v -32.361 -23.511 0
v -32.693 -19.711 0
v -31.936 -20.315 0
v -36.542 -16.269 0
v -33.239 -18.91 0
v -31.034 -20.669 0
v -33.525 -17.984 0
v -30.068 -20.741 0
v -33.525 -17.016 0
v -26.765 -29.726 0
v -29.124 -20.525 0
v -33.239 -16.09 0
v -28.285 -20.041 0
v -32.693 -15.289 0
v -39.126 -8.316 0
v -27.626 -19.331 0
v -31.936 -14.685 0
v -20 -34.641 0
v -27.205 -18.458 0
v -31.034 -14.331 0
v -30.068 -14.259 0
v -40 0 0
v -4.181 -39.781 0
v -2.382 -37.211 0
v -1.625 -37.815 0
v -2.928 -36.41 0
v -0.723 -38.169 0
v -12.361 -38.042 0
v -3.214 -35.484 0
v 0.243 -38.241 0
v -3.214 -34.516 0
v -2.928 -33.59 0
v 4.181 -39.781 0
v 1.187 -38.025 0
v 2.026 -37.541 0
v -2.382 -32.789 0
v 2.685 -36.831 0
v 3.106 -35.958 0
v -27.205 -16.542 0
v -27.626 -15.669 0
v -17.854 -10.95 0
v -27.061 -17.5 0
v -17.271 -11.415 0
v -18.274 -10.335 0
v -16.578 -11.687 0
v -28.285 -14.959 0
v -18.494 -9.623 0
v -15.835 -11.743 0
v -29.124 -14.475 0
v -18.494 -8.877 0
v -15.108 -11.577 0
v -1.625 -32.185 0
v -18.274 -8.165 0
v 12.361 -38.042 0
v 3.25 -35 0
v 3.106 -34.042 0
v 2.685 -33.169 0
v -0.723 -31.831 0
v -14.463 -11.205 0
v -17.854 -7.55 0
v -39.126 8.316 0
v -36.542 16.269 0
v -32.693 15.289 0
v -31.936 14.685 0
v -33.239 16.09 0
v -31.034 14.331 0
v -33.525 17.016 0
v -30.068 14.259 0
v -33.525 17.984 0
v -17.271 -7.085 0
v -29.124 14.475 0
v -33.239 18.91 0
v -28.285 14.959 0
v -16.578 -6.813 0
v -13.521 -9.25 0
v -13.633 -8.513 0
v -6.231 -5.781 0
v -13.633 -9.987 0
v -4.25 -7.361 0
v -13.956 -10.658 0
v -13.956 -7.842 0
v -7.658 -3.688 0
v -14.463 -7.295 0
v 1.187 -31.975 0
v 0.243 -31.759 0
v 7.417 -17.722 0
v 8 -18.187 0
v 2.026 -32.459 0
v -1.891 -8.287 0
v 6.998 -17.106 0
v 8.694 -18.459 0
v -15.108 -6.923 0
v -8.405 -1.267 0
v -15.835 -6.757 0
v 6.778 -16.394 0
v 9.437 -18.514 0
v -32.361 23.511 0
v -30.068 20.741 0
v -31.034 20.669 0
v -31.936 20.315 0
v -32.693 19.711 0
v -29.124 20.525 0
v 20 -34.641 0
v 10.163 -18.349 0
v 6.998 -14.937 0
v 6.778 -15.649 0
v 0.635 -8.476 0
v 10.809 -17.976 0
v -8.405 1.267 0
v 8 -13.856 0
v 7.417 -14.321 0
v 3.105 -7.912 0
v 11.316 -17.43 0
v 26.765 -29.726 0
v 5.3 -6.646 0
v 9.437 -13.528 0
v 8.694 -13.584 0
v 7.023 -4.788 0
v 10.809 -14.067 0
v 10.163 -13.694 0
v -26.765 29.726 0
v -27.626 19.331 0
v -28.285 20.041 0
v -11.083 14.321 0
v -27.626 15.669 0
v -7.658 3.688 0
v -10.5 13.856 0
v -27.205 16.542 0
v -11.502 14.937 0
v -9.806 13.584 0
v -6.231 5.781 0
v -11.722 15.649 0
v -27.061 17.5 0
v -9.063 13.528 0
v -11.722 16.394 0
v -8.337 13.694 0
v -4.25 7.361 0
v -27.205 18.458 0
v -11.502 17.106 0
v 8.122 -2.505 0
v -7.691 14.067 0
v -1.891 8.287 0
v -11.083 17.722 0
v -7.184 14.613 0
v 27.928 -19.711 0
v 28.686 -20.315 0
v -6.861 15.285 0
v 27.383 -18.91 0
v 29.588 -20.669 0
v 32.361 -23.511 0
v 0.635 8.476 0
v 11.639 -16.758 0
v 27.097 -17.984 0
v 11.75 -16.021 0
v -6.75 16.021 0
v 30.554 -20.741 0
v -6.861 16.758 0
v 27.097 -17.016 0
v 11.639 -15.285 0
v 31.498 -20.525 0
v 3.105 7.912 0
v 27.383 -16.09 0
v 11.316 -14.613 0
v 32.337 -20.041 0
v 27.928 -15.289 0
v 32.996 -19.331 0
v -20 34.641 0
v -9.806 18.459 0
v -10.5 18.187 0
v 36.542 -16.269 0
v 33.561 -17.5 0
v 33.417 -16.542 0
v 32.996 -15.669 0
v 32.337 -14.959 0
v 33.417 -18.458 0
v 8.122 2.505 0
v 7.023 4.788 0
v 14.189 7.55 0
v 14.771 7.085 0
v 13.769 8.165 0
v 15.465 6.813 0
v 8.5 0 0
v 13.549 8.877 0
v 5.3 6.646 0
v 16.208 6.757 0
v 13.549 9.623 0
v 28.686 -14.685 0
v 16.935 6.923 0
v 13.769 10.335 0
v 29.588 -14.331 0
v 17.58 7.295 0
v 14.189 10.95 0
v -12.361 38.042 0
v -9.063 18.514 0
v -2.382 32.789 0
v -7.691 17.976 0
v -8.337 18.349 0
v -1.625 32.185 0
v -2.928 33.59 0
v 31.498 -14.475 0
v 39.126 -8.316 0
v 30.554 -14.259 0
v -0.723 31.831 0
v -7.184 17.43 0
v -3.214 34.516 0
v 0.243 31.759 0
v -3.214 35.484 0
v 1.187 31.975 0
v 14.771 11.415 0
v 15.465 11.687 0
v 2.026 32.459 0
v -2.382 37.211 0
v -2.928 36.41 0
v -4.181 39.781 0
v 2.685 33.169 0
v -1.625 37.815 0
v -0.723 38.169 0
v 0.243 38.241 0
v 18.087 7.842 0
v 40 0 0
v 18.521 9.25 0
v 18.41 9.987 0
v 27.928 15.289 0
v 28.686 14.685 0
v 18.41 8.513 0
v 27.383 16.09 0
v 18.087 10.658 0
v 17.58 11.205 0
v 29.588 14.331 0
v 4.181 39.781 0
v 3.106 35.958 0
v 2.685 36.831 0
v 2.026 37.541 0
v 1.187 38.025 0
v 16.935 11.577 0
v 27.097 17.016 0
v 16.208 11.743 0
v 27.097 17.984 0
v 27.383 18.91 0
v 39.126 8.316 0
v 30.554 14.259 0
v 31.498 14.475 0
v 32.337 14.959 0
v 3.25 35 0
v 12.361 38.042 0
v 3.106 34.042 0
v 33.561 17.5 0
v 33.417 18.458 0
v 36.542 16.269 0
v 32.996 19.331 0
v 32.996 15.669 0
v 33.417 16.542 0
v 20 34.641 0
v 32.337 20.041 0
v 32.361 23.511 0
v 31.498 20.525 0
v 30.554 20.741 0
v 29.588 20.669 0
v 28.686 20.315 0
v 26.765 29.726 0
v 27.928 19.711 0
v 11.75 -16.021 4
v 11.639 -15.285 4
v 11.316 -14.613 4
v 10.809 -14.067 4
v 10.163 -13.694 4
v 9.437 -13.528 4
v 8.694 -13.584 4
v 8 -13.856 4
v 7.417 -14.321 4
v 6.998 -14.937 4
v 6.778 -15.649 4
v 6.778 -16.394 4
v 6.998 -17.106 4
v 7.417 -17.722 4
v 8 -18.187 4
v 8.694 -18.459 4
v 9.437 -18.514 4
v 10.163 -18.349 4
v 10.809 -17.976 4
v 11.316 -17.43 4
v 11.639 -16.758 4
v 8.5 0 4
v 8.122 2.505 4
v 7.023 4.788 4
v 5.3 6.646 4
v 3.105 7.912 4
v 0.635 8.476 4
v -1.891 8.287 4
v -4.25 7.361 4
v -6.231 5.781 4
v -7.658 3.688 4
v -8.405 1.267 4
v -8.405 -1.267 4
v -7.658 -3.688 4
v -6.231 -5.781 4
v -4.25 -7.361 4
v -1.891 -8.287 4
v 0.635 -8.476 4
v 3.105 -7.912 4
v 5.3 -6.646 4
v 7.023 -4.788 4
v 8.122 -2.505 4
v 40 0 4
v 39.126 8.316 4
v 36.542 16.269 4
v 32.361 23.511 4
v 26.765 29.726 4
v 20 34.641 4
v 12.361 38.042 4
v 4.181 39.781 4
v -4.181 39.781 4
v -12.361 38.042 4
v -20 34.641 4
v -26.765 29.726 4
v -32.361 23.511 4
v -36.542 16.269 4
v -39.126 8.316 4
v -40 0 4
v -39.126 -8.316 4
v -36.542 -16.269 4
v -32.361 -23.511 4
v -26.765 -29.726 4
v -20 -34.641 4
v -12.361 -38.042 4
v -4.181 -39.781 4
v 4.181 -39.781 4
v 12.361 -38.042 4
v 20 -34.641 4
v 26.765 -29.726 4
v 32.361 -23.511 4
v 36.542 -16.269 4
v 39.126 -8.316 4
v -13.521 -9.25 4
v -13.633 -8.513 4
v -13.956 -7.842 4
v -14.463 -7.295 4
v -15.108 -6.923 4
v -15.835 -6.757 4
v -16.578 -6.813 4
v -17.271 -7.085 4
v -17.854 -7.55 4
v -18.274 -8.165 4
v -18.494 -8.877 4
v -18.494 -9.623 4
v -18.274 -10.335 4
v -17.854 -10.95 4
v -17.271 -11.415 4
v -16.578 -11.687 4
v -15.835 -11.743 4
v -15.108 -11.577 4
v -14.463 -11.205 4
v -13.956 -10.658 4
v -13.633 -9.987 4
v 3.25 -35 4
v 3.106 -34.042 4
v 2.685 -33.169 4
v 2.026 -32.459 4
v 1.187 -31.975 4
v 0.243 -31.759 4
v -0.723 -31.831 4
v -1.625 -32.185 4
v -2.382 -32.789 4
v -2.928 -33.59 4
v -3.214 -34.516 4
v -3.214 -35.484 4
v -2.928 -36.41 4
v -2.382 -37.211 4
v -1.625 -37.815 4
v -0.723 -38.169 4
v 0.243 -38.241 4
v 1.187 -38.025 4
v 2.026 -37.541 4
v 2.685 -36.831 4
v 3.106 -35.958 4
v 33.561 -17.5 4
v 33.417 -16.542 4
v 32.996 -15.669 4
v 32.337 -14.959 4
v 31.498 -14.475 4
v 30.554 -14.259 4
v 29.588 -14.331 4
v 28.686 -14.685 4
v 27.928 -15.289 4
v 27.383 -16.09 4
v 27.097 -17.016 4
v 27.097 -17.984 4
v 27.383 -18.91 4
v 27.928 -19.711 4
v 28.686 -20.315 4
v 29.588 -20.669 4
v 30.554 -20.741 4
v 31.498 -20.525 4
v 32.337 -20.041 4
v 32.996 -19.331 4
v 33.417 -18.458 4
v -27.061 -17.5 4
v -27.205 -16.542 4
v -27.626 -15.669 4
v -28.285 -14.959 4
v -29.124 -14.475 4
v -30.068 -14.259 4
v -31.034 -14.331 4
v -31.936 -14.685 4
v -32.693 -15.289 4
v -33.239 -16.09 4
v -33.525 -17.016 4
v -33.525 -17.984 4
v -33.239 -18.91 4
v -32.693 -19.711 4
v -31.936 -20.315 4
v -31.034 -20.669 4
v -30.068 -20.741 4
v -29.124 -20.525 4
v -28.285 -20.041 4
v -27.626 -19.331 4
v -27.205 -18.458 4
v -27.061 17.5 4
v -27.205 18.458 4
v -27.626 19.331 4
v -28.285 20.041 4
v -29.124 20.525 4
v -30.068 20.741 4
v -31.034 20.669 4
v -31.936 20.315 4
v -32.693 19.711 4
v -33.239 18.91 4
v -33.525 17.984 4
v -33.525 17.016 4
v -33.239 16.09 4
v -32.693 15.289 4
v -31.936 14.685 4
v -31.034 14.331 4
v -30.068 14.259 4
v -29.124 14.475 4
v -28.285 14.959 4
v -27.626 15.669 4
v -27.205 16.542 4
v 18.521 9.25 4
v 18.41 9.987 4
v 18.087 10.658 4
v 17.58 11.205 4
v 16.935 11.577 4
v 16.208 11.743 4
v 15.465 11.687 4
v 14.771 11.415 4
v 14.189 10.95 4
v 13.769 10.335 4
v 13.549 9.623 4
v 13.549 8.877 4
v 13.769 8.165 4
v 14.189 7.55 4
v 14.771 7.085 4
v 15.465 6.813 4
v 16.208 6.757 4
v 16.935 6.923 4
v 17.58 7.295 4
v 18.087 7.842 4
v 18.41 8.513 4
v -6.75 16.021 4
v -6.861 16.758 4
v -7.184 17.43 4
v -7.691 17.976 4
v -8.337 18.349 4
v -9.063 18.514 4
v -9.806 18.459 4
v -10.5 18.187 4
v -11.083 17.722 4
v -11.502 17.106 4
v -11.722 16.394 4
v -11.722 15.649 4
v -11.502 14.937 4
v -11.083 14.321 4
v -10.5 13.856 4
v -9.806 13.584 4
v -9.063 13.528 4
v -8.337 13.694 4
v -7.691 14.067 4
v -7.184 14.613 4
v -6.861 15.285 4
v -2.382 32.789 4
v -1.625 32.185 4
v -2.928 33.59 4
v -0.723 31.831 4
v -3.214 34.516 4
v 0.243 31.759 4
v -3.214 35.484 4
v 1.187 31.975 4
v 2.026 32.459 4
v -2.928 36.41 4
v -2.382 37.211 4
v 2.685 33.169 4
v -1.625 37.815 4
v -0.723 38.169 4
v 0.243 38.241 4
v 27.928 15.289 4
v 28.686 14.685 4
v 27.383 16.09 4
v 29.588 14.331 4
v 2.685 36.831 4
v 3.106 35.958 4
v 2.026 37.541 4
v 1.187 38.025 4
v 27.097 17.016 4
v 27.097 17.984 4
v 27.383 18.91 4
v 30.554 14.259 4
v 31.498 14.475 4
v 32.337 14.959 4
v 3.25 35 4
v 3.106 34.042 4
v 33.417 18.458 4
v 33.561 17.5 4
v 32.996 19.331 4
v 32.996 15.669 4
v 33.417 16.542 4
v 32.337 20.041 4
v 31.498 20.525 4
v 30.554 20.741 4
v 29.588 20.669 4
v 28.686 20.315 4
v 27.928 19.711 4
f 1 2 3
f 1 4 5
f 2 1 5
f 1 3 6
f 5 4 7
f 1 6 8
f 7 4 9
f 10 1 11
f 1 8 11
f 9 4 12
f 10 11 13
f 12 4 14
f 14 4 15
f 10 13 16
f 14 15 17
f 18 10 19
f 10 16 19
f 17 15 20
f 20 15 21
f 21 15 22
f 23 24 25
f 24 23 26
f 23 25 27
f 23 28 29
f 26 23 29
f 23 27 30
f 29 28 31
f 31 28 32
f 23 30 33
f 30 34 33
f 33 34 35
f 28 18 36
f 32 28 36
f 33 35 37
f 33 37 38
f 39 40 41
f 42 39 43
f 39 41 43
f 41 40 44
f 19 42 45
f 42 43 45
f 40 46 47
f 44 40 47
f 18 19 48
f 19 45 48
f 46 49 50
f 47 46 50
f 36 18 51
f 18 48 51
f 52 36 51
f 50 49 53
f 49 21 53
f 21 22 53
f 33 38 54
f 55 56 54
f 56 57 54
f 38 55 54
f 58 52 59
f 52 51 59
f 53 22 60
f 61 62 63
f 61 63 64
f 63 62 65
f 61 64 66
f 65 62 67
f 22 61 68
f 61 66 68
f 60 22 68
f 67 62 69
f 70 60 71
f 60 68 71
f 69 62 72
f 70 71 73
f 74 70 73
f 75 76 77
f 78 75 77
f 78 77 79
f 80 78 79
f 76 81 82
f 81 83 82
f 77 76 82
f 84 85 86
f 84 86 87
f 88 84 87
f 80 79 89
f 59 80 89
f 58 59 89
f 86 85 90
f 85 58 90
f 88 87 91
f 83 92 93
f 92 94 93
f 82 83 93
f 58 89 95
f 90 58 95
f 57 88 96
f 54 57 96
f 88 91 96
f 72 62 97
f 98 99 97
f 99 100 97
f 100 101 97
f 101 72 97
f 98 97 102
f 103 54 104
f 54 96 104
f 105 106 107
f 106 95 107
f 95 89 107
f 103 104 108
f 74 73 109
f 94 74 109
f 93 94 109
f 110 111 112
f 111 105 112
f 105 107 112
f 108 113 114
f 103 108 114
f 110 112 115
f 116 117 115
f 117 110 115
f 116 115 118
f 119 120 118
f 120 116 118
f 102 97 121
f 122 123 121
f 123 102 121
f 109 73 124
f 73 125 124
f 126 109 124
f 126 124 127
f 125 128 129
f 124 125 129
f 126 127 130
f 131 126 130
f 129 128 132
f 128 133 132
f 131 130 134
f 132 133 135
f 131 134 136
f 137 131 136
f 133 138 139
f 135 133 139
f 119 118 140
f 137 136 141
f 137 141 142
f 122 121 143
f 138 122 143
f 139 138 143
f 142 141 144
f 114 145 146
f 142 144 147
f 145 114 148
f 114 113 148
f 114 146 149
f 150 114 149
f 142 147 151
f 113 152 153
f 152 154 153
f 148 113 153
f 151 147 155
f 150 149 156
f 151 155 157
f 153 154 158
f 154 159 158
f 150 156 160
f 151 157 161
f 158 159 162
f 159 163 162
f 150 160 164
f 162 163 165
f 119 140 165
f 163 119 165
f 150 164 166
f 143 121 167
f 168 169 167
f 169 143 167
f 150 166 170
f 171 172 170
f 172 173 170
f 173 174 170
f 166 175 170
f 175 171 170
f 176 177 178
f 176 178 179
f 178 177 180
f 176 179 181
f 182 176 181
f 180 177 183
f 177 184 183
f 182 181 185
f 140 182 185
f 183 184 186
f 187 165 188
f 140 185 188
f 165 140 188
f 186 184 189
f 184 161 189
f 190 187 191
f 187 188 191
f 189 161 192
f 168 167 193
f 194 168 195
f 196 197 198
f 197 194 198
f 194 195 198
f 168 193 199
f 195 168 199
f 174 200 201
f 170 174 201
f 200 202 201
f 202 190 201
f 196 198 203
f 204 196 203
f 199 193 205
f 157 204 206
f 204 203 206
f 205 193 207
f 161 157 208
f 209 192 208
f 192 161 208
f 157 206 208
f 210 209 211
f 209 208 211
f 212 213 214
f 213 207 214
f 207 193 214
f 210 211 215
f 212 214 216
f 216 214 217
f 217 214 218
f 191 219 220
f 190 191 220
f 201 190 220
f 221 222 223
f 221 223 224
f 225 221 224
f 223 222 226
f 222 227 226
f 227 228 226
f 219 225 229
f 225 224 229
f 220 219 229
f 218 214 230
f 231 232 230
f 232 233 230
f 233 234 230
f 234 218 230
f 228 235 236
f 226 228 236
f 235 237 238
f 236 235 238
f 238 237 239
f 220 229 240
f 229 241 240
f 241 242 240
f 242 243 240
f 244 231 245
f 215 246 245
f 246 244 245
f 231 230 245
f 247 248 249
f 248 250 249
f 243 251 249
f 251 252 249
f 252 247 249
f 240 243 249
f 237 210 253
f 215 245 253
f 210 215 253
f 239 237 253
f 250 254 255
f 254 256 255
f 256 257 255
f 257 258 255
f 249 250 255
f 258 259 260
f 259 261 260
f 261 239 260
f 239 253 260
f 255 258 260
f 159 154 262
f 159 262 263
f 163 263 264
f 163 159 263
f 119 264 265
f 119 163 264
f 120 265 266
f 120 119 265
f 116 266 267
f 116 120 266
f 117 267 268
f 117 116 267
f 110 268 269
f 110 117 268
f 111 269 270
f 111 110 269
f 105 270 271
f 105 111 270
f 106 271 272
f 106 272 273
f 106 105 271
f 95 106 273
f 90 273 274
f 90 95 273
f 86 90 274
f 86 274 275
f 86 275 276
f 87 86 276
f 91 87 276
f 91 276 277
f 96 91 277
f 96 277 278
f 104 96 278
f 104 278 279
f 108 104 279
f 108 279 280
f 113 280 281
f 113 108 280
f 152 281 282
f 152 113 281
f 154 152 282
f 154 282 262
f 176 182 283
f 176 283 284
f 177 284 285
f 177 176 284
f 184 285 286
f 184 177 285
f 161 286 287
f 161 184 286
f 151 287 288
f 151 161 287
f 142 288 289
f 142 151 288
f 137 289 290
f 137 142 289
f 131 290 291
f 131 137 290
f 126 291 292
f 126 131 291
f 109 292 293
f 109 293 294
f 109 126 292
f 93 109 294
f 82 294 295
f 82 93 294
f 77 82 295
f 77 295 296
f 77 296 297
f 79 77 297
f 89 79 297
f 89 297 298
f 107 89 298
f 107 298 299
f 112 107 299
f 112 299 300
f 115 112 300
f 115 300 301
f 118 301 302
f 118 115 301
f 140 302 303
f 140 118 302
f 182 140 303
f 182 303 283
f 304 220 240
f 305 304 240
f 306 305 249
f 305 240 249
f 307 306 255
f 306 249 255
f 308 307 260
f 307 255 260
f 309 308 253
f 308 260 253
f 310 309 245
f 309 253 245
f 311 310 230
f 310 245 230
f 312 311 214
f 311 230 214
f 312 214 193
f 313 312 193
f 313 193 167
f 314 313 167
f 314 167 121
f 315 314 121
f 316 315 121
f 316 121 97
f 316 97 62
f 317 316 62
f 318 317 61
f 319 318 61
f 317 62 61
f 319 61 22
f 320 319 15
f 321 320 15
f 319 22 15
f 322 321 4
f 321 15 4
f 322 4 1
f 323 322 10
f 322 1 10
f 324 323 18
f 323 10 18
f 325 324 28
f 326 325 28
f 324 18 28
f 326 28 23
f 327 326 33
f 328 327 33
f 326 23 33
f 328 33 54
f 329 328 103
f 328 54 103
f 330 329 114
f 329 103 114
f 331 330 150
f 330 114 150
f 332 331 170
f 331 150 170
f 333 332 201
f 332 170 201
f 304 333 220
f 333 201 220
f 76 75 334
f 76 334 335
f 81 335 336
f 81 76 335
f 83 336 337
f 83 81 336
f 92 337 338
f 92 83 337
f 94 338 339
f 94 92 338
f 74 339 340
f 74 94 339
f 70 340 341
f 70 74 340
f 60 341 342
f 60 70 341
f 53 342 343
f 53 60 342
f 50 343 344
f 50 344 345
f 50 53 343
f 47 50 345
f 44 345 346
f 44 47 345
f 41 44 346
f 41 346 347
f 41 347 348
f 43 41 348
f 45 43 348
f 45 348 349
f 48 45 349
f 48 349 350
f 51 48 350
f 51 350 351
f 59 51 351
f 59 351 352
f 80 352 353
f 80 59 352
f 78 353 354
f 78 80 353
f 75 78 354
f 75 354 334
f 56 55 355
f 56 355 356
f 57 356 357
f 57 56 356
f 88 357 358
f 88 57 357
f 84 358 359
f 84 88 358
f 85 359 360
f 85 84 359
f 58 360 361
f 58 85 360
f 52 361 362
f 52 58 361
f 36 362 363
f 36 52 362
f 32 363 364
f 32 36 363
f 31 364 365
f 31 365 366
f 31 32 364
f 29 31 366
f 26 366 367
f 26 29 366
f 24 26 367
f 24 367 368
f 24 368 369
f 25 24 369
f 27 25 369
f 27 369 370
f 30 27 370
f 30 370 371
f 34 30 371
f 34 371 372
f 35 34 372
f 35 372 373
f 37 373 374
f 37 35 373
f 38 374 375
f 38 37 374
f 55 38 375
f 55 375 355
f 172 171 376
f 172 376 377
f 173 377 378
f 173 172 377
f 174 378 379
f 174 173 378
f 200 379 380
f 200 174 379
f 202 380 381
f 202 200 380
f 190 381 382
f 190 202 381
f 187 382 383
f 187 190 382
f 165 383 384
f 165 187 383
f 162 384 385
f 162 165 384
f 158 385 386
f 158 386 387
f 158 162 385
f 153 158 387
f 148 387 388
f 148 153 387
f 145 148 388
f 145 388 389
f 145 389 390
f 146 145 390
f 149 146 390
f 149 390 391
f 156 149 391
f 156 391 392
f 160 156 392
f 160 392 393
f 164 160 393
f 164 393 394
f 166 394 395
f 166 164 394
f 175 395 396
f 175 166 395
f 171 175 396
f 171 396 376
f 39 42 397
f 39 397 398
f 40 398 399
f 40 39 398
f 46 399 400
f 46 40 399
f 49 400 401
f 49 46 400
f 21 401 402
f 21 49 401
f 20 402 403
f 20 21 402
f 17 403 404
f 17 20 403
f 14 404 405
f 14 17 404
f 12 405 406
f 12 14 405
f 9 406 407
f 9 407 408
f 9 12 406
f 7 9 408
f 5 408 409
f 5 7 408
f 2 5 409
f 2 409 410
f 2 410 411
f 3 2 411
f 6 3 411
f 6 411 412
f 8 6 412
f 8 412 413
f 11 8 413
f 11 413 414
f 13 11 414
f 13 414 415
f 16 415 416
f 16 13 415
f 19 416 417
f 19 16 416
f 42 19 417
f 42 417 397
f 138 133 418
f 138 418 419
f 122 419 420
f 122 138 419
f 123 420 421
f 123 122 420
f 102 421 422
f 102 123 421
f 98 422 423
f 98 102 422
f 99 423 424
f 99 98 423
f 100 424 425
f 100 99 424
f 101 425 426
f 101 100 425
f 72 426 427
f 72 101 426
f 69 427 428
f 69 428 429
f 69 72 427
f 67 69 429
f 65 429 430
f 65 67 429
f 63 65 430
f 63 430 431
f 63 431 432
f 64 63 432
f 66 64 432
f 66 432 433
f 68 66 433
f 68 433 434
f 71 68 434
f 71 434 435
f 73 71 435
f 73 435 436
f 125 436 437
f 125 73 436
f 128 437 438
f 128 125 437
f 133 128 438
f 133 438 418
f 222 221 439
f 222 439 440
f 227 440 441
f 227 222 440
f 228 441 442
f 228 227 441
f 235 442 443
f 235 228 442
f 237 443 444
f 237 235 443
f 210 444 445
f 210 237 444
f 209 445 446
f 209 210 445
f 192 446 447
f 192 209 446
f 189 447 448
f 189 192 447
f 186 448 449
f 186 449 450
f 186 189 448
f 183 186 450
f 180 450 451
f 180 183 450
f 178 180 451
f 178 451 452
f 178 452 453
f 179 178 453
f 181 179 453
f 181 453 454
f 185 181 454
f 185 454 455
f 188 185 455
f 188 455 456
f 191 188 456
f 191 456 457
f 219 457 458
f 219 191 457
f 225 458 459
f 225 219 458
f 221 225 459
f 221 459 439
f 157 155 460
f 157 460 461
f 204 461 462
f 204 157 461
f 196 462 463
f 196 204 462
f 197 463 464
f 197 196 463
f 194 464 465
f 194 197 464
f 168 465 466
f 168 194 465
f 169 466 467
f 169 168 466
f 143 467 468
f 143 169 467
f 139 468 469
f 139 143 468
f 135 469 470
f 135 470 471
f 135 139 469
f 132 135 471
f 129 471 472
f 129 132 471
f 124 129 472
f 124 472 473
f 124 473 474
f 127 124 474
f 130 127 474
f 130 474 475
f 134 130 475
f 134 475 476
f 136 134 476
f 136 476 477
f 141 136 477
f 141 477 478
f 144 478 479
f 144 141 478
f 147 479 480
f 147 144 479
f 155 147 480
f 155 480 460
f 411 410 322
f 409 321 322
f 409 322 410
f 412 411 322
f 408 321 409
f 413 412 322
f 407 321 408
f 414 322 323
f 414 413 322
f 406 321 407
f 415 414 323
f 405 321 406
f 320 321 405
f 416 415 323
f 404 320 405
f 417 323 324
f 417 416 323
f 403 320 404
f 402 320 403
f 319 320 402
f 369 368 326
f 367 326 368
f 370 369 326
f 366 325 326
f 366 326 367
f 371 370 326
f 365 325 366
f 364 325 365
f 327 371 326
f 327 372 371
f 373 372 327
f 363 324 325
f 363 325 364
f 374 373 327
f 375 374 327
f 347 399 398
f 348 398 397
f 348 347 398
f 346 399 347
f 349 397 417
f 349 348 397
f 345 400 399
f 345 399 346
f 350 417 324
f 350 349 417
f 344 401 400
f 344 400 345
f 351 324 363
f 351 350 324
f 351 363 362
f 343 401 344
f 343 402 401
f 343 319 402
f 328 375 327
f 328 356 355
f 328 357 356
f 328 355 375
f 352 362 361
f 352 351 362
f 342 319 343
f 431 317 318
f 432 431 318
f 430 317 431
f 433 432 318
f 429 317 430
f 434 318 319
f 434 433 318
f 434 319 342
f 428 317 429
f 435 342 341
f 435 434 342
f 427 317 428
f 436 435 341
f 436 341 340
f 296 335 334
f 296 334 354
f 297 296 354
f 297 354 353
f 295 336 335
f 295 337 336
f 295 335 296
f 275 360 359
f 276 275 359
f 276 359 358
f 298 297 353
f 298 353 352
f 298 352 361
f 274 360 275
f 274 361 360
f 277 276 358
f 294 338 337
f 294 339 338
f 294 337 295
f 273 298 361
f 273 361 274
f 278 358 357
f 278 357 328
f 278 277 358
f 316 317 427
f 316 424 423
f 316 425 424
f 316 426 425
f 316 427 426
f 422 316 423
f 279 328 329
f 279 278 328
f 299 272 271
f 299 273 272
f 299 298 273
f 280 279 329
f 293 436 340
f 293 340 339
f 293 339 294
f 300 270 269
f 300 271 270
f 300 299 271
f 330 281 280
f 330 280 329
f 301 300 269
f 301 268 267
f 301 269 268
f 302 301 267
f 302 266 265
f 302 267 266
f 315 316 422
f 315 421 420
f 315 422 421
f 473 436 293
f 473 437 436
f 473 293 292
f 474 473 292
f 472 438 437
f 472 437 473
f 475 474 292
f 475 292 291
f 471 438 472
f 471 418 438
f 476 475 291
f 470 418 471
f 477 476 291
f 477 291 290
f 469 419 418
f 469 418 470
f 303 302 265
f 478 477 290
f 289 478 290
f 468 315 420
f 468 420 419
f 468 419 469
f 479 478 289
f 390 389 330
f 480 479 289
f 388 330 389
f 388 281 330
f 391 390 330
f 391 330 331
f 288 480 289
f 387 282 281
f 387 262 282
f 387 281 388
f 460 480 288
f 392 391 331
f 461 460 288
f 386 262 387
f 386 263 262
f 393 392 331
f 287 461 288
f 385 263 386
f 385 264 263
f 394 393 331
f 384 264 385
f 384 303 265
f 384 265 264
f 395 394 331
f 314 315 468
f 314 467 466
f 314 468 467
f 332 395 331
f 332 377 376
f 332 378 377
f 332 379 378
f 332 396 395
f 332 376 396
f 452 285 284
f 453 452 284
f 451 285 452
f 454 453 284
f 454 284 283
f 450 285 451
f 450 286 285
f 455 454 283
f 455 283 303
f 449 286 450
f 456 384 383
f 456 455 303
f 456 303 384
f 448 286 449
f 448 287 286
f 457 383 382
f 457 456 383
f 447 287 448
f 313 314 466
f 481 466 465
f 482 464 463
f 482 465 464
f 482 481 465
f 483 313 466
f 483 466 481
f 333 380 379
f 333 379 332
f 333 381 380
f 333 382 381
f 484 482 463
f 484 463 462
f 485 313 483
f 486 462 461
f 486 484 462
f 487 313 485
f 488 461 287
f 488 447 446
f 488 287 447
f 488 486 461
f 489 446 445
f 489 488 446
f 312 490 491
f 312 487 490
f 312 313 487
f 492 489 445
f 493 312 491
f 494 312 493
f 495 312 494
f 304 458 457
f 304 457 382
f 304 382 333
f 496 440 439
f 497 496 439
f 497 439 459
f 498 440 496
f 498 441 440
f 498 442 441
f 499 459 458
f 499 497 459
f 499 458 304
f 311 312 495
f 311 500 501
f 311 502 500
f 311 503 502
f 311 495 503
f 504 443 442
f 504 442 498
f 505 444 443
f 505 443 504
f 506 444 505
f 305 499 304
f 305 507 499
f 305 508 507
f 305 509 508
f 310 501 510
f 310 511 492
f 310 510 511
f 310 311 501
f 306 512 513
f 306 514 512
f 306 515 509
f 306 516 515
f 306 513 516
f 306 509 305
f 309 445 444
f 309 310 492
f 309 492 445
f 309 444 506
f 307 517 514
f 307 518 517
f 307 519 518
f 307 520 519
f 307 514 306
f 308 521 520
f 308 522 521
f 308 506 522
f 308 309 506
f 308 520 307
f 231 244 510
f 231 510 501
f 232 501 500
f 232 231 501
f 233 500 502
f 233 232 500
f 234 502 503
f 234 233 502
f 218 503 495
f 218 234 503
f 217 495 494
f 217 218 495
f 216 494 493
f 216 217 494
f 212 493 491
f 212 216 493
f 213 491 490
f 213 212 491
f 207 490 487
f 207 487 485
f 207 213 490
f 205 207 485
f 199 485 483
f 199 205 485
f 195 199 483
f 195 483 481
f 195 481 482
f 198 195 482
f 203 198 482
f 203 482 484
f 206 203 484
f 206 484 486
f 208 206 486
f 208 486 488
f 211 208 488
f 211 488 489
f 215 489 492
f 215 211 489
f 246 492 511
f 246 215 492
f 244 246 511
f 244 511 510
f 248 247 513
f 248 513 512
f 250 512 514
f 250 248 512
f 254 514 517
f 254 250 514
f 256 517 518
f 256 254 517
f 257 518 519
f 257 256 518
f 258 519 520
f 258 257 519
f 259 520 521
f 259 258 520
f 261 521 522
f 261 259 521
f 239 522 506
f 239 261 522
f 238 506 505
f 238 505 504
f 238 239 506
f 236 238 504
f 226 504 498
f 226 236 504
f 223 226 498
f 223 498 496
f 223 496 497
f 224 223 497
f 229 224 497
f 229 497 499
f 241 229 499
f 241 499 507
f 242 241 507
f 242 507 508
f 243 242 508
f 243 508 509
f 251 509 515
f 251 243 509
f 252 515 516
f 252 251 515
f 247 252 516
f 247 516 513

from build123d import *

# Parameters (mm, degrees)
SKETCH_1_R      = 40
SKETCH_1_R_2    = 3.25
SKETCH_1_R_3    = 8.5
SKETCH_1_R_4    = 2.5
EXTRUDE_1_DEPTH = 4


with BuildPart() as part:
    # 草图1 → 凸台-拉伸1 (new body)
    with BuildSketch(Plane.XY):
        Circle(SKETCH_1_R)
        with Locations((0, 35)):
            Circle(SKETCH_1_R_2, mode=Mode.SUBTRACT)
        with Locations((30.310889132, 17.5)):
            Circle(SKETCH_1_R_2, mode=Mode.SUBTRACT)
        with Locations((30.310889132, -17.5)):
            Circle(SKETCH_1_R_2, mode=Mode.SUBTRACT)
        with Locations((0, -35)):
            Circle(SKETCH_1_R_2, mode=Mode.SUBTRACT)
        with Locations((-30.310889132, -17.5)):
            Circle(SKETCH_1_R_2, mode=Mode.SUBTRACT)
        with Locations((-30.310889132, 17.5)):
            Circle(SKETCH_1_R_2, mode=Mode.SUBTRACT)
        Circle(SKETCH_1_R_3, mode=Mode.SUBTRACT)
        with Locations((-9.25, 16.02146997)):
            Circle(SKETCH_1_R_4, mode=Mode.SUBTRACT)
        with Locations((16.02146997, 9.25)):
            Circle(SKETCH_1_R_4, mode=Mode.SUBTRACT)
        with Locations((9.25, -16.02146997)):
            Circle(SKETCH_1_R_4, mode=Mode.SUBTRACT)
        with Locations((-16.02146997, -9.25)):
            Circle(SKETCH_1_R_4, mode=Mode.SUBTRACT)
    extrude(amount=EXTRUDE_1_DEPTH)


solid = part.part
